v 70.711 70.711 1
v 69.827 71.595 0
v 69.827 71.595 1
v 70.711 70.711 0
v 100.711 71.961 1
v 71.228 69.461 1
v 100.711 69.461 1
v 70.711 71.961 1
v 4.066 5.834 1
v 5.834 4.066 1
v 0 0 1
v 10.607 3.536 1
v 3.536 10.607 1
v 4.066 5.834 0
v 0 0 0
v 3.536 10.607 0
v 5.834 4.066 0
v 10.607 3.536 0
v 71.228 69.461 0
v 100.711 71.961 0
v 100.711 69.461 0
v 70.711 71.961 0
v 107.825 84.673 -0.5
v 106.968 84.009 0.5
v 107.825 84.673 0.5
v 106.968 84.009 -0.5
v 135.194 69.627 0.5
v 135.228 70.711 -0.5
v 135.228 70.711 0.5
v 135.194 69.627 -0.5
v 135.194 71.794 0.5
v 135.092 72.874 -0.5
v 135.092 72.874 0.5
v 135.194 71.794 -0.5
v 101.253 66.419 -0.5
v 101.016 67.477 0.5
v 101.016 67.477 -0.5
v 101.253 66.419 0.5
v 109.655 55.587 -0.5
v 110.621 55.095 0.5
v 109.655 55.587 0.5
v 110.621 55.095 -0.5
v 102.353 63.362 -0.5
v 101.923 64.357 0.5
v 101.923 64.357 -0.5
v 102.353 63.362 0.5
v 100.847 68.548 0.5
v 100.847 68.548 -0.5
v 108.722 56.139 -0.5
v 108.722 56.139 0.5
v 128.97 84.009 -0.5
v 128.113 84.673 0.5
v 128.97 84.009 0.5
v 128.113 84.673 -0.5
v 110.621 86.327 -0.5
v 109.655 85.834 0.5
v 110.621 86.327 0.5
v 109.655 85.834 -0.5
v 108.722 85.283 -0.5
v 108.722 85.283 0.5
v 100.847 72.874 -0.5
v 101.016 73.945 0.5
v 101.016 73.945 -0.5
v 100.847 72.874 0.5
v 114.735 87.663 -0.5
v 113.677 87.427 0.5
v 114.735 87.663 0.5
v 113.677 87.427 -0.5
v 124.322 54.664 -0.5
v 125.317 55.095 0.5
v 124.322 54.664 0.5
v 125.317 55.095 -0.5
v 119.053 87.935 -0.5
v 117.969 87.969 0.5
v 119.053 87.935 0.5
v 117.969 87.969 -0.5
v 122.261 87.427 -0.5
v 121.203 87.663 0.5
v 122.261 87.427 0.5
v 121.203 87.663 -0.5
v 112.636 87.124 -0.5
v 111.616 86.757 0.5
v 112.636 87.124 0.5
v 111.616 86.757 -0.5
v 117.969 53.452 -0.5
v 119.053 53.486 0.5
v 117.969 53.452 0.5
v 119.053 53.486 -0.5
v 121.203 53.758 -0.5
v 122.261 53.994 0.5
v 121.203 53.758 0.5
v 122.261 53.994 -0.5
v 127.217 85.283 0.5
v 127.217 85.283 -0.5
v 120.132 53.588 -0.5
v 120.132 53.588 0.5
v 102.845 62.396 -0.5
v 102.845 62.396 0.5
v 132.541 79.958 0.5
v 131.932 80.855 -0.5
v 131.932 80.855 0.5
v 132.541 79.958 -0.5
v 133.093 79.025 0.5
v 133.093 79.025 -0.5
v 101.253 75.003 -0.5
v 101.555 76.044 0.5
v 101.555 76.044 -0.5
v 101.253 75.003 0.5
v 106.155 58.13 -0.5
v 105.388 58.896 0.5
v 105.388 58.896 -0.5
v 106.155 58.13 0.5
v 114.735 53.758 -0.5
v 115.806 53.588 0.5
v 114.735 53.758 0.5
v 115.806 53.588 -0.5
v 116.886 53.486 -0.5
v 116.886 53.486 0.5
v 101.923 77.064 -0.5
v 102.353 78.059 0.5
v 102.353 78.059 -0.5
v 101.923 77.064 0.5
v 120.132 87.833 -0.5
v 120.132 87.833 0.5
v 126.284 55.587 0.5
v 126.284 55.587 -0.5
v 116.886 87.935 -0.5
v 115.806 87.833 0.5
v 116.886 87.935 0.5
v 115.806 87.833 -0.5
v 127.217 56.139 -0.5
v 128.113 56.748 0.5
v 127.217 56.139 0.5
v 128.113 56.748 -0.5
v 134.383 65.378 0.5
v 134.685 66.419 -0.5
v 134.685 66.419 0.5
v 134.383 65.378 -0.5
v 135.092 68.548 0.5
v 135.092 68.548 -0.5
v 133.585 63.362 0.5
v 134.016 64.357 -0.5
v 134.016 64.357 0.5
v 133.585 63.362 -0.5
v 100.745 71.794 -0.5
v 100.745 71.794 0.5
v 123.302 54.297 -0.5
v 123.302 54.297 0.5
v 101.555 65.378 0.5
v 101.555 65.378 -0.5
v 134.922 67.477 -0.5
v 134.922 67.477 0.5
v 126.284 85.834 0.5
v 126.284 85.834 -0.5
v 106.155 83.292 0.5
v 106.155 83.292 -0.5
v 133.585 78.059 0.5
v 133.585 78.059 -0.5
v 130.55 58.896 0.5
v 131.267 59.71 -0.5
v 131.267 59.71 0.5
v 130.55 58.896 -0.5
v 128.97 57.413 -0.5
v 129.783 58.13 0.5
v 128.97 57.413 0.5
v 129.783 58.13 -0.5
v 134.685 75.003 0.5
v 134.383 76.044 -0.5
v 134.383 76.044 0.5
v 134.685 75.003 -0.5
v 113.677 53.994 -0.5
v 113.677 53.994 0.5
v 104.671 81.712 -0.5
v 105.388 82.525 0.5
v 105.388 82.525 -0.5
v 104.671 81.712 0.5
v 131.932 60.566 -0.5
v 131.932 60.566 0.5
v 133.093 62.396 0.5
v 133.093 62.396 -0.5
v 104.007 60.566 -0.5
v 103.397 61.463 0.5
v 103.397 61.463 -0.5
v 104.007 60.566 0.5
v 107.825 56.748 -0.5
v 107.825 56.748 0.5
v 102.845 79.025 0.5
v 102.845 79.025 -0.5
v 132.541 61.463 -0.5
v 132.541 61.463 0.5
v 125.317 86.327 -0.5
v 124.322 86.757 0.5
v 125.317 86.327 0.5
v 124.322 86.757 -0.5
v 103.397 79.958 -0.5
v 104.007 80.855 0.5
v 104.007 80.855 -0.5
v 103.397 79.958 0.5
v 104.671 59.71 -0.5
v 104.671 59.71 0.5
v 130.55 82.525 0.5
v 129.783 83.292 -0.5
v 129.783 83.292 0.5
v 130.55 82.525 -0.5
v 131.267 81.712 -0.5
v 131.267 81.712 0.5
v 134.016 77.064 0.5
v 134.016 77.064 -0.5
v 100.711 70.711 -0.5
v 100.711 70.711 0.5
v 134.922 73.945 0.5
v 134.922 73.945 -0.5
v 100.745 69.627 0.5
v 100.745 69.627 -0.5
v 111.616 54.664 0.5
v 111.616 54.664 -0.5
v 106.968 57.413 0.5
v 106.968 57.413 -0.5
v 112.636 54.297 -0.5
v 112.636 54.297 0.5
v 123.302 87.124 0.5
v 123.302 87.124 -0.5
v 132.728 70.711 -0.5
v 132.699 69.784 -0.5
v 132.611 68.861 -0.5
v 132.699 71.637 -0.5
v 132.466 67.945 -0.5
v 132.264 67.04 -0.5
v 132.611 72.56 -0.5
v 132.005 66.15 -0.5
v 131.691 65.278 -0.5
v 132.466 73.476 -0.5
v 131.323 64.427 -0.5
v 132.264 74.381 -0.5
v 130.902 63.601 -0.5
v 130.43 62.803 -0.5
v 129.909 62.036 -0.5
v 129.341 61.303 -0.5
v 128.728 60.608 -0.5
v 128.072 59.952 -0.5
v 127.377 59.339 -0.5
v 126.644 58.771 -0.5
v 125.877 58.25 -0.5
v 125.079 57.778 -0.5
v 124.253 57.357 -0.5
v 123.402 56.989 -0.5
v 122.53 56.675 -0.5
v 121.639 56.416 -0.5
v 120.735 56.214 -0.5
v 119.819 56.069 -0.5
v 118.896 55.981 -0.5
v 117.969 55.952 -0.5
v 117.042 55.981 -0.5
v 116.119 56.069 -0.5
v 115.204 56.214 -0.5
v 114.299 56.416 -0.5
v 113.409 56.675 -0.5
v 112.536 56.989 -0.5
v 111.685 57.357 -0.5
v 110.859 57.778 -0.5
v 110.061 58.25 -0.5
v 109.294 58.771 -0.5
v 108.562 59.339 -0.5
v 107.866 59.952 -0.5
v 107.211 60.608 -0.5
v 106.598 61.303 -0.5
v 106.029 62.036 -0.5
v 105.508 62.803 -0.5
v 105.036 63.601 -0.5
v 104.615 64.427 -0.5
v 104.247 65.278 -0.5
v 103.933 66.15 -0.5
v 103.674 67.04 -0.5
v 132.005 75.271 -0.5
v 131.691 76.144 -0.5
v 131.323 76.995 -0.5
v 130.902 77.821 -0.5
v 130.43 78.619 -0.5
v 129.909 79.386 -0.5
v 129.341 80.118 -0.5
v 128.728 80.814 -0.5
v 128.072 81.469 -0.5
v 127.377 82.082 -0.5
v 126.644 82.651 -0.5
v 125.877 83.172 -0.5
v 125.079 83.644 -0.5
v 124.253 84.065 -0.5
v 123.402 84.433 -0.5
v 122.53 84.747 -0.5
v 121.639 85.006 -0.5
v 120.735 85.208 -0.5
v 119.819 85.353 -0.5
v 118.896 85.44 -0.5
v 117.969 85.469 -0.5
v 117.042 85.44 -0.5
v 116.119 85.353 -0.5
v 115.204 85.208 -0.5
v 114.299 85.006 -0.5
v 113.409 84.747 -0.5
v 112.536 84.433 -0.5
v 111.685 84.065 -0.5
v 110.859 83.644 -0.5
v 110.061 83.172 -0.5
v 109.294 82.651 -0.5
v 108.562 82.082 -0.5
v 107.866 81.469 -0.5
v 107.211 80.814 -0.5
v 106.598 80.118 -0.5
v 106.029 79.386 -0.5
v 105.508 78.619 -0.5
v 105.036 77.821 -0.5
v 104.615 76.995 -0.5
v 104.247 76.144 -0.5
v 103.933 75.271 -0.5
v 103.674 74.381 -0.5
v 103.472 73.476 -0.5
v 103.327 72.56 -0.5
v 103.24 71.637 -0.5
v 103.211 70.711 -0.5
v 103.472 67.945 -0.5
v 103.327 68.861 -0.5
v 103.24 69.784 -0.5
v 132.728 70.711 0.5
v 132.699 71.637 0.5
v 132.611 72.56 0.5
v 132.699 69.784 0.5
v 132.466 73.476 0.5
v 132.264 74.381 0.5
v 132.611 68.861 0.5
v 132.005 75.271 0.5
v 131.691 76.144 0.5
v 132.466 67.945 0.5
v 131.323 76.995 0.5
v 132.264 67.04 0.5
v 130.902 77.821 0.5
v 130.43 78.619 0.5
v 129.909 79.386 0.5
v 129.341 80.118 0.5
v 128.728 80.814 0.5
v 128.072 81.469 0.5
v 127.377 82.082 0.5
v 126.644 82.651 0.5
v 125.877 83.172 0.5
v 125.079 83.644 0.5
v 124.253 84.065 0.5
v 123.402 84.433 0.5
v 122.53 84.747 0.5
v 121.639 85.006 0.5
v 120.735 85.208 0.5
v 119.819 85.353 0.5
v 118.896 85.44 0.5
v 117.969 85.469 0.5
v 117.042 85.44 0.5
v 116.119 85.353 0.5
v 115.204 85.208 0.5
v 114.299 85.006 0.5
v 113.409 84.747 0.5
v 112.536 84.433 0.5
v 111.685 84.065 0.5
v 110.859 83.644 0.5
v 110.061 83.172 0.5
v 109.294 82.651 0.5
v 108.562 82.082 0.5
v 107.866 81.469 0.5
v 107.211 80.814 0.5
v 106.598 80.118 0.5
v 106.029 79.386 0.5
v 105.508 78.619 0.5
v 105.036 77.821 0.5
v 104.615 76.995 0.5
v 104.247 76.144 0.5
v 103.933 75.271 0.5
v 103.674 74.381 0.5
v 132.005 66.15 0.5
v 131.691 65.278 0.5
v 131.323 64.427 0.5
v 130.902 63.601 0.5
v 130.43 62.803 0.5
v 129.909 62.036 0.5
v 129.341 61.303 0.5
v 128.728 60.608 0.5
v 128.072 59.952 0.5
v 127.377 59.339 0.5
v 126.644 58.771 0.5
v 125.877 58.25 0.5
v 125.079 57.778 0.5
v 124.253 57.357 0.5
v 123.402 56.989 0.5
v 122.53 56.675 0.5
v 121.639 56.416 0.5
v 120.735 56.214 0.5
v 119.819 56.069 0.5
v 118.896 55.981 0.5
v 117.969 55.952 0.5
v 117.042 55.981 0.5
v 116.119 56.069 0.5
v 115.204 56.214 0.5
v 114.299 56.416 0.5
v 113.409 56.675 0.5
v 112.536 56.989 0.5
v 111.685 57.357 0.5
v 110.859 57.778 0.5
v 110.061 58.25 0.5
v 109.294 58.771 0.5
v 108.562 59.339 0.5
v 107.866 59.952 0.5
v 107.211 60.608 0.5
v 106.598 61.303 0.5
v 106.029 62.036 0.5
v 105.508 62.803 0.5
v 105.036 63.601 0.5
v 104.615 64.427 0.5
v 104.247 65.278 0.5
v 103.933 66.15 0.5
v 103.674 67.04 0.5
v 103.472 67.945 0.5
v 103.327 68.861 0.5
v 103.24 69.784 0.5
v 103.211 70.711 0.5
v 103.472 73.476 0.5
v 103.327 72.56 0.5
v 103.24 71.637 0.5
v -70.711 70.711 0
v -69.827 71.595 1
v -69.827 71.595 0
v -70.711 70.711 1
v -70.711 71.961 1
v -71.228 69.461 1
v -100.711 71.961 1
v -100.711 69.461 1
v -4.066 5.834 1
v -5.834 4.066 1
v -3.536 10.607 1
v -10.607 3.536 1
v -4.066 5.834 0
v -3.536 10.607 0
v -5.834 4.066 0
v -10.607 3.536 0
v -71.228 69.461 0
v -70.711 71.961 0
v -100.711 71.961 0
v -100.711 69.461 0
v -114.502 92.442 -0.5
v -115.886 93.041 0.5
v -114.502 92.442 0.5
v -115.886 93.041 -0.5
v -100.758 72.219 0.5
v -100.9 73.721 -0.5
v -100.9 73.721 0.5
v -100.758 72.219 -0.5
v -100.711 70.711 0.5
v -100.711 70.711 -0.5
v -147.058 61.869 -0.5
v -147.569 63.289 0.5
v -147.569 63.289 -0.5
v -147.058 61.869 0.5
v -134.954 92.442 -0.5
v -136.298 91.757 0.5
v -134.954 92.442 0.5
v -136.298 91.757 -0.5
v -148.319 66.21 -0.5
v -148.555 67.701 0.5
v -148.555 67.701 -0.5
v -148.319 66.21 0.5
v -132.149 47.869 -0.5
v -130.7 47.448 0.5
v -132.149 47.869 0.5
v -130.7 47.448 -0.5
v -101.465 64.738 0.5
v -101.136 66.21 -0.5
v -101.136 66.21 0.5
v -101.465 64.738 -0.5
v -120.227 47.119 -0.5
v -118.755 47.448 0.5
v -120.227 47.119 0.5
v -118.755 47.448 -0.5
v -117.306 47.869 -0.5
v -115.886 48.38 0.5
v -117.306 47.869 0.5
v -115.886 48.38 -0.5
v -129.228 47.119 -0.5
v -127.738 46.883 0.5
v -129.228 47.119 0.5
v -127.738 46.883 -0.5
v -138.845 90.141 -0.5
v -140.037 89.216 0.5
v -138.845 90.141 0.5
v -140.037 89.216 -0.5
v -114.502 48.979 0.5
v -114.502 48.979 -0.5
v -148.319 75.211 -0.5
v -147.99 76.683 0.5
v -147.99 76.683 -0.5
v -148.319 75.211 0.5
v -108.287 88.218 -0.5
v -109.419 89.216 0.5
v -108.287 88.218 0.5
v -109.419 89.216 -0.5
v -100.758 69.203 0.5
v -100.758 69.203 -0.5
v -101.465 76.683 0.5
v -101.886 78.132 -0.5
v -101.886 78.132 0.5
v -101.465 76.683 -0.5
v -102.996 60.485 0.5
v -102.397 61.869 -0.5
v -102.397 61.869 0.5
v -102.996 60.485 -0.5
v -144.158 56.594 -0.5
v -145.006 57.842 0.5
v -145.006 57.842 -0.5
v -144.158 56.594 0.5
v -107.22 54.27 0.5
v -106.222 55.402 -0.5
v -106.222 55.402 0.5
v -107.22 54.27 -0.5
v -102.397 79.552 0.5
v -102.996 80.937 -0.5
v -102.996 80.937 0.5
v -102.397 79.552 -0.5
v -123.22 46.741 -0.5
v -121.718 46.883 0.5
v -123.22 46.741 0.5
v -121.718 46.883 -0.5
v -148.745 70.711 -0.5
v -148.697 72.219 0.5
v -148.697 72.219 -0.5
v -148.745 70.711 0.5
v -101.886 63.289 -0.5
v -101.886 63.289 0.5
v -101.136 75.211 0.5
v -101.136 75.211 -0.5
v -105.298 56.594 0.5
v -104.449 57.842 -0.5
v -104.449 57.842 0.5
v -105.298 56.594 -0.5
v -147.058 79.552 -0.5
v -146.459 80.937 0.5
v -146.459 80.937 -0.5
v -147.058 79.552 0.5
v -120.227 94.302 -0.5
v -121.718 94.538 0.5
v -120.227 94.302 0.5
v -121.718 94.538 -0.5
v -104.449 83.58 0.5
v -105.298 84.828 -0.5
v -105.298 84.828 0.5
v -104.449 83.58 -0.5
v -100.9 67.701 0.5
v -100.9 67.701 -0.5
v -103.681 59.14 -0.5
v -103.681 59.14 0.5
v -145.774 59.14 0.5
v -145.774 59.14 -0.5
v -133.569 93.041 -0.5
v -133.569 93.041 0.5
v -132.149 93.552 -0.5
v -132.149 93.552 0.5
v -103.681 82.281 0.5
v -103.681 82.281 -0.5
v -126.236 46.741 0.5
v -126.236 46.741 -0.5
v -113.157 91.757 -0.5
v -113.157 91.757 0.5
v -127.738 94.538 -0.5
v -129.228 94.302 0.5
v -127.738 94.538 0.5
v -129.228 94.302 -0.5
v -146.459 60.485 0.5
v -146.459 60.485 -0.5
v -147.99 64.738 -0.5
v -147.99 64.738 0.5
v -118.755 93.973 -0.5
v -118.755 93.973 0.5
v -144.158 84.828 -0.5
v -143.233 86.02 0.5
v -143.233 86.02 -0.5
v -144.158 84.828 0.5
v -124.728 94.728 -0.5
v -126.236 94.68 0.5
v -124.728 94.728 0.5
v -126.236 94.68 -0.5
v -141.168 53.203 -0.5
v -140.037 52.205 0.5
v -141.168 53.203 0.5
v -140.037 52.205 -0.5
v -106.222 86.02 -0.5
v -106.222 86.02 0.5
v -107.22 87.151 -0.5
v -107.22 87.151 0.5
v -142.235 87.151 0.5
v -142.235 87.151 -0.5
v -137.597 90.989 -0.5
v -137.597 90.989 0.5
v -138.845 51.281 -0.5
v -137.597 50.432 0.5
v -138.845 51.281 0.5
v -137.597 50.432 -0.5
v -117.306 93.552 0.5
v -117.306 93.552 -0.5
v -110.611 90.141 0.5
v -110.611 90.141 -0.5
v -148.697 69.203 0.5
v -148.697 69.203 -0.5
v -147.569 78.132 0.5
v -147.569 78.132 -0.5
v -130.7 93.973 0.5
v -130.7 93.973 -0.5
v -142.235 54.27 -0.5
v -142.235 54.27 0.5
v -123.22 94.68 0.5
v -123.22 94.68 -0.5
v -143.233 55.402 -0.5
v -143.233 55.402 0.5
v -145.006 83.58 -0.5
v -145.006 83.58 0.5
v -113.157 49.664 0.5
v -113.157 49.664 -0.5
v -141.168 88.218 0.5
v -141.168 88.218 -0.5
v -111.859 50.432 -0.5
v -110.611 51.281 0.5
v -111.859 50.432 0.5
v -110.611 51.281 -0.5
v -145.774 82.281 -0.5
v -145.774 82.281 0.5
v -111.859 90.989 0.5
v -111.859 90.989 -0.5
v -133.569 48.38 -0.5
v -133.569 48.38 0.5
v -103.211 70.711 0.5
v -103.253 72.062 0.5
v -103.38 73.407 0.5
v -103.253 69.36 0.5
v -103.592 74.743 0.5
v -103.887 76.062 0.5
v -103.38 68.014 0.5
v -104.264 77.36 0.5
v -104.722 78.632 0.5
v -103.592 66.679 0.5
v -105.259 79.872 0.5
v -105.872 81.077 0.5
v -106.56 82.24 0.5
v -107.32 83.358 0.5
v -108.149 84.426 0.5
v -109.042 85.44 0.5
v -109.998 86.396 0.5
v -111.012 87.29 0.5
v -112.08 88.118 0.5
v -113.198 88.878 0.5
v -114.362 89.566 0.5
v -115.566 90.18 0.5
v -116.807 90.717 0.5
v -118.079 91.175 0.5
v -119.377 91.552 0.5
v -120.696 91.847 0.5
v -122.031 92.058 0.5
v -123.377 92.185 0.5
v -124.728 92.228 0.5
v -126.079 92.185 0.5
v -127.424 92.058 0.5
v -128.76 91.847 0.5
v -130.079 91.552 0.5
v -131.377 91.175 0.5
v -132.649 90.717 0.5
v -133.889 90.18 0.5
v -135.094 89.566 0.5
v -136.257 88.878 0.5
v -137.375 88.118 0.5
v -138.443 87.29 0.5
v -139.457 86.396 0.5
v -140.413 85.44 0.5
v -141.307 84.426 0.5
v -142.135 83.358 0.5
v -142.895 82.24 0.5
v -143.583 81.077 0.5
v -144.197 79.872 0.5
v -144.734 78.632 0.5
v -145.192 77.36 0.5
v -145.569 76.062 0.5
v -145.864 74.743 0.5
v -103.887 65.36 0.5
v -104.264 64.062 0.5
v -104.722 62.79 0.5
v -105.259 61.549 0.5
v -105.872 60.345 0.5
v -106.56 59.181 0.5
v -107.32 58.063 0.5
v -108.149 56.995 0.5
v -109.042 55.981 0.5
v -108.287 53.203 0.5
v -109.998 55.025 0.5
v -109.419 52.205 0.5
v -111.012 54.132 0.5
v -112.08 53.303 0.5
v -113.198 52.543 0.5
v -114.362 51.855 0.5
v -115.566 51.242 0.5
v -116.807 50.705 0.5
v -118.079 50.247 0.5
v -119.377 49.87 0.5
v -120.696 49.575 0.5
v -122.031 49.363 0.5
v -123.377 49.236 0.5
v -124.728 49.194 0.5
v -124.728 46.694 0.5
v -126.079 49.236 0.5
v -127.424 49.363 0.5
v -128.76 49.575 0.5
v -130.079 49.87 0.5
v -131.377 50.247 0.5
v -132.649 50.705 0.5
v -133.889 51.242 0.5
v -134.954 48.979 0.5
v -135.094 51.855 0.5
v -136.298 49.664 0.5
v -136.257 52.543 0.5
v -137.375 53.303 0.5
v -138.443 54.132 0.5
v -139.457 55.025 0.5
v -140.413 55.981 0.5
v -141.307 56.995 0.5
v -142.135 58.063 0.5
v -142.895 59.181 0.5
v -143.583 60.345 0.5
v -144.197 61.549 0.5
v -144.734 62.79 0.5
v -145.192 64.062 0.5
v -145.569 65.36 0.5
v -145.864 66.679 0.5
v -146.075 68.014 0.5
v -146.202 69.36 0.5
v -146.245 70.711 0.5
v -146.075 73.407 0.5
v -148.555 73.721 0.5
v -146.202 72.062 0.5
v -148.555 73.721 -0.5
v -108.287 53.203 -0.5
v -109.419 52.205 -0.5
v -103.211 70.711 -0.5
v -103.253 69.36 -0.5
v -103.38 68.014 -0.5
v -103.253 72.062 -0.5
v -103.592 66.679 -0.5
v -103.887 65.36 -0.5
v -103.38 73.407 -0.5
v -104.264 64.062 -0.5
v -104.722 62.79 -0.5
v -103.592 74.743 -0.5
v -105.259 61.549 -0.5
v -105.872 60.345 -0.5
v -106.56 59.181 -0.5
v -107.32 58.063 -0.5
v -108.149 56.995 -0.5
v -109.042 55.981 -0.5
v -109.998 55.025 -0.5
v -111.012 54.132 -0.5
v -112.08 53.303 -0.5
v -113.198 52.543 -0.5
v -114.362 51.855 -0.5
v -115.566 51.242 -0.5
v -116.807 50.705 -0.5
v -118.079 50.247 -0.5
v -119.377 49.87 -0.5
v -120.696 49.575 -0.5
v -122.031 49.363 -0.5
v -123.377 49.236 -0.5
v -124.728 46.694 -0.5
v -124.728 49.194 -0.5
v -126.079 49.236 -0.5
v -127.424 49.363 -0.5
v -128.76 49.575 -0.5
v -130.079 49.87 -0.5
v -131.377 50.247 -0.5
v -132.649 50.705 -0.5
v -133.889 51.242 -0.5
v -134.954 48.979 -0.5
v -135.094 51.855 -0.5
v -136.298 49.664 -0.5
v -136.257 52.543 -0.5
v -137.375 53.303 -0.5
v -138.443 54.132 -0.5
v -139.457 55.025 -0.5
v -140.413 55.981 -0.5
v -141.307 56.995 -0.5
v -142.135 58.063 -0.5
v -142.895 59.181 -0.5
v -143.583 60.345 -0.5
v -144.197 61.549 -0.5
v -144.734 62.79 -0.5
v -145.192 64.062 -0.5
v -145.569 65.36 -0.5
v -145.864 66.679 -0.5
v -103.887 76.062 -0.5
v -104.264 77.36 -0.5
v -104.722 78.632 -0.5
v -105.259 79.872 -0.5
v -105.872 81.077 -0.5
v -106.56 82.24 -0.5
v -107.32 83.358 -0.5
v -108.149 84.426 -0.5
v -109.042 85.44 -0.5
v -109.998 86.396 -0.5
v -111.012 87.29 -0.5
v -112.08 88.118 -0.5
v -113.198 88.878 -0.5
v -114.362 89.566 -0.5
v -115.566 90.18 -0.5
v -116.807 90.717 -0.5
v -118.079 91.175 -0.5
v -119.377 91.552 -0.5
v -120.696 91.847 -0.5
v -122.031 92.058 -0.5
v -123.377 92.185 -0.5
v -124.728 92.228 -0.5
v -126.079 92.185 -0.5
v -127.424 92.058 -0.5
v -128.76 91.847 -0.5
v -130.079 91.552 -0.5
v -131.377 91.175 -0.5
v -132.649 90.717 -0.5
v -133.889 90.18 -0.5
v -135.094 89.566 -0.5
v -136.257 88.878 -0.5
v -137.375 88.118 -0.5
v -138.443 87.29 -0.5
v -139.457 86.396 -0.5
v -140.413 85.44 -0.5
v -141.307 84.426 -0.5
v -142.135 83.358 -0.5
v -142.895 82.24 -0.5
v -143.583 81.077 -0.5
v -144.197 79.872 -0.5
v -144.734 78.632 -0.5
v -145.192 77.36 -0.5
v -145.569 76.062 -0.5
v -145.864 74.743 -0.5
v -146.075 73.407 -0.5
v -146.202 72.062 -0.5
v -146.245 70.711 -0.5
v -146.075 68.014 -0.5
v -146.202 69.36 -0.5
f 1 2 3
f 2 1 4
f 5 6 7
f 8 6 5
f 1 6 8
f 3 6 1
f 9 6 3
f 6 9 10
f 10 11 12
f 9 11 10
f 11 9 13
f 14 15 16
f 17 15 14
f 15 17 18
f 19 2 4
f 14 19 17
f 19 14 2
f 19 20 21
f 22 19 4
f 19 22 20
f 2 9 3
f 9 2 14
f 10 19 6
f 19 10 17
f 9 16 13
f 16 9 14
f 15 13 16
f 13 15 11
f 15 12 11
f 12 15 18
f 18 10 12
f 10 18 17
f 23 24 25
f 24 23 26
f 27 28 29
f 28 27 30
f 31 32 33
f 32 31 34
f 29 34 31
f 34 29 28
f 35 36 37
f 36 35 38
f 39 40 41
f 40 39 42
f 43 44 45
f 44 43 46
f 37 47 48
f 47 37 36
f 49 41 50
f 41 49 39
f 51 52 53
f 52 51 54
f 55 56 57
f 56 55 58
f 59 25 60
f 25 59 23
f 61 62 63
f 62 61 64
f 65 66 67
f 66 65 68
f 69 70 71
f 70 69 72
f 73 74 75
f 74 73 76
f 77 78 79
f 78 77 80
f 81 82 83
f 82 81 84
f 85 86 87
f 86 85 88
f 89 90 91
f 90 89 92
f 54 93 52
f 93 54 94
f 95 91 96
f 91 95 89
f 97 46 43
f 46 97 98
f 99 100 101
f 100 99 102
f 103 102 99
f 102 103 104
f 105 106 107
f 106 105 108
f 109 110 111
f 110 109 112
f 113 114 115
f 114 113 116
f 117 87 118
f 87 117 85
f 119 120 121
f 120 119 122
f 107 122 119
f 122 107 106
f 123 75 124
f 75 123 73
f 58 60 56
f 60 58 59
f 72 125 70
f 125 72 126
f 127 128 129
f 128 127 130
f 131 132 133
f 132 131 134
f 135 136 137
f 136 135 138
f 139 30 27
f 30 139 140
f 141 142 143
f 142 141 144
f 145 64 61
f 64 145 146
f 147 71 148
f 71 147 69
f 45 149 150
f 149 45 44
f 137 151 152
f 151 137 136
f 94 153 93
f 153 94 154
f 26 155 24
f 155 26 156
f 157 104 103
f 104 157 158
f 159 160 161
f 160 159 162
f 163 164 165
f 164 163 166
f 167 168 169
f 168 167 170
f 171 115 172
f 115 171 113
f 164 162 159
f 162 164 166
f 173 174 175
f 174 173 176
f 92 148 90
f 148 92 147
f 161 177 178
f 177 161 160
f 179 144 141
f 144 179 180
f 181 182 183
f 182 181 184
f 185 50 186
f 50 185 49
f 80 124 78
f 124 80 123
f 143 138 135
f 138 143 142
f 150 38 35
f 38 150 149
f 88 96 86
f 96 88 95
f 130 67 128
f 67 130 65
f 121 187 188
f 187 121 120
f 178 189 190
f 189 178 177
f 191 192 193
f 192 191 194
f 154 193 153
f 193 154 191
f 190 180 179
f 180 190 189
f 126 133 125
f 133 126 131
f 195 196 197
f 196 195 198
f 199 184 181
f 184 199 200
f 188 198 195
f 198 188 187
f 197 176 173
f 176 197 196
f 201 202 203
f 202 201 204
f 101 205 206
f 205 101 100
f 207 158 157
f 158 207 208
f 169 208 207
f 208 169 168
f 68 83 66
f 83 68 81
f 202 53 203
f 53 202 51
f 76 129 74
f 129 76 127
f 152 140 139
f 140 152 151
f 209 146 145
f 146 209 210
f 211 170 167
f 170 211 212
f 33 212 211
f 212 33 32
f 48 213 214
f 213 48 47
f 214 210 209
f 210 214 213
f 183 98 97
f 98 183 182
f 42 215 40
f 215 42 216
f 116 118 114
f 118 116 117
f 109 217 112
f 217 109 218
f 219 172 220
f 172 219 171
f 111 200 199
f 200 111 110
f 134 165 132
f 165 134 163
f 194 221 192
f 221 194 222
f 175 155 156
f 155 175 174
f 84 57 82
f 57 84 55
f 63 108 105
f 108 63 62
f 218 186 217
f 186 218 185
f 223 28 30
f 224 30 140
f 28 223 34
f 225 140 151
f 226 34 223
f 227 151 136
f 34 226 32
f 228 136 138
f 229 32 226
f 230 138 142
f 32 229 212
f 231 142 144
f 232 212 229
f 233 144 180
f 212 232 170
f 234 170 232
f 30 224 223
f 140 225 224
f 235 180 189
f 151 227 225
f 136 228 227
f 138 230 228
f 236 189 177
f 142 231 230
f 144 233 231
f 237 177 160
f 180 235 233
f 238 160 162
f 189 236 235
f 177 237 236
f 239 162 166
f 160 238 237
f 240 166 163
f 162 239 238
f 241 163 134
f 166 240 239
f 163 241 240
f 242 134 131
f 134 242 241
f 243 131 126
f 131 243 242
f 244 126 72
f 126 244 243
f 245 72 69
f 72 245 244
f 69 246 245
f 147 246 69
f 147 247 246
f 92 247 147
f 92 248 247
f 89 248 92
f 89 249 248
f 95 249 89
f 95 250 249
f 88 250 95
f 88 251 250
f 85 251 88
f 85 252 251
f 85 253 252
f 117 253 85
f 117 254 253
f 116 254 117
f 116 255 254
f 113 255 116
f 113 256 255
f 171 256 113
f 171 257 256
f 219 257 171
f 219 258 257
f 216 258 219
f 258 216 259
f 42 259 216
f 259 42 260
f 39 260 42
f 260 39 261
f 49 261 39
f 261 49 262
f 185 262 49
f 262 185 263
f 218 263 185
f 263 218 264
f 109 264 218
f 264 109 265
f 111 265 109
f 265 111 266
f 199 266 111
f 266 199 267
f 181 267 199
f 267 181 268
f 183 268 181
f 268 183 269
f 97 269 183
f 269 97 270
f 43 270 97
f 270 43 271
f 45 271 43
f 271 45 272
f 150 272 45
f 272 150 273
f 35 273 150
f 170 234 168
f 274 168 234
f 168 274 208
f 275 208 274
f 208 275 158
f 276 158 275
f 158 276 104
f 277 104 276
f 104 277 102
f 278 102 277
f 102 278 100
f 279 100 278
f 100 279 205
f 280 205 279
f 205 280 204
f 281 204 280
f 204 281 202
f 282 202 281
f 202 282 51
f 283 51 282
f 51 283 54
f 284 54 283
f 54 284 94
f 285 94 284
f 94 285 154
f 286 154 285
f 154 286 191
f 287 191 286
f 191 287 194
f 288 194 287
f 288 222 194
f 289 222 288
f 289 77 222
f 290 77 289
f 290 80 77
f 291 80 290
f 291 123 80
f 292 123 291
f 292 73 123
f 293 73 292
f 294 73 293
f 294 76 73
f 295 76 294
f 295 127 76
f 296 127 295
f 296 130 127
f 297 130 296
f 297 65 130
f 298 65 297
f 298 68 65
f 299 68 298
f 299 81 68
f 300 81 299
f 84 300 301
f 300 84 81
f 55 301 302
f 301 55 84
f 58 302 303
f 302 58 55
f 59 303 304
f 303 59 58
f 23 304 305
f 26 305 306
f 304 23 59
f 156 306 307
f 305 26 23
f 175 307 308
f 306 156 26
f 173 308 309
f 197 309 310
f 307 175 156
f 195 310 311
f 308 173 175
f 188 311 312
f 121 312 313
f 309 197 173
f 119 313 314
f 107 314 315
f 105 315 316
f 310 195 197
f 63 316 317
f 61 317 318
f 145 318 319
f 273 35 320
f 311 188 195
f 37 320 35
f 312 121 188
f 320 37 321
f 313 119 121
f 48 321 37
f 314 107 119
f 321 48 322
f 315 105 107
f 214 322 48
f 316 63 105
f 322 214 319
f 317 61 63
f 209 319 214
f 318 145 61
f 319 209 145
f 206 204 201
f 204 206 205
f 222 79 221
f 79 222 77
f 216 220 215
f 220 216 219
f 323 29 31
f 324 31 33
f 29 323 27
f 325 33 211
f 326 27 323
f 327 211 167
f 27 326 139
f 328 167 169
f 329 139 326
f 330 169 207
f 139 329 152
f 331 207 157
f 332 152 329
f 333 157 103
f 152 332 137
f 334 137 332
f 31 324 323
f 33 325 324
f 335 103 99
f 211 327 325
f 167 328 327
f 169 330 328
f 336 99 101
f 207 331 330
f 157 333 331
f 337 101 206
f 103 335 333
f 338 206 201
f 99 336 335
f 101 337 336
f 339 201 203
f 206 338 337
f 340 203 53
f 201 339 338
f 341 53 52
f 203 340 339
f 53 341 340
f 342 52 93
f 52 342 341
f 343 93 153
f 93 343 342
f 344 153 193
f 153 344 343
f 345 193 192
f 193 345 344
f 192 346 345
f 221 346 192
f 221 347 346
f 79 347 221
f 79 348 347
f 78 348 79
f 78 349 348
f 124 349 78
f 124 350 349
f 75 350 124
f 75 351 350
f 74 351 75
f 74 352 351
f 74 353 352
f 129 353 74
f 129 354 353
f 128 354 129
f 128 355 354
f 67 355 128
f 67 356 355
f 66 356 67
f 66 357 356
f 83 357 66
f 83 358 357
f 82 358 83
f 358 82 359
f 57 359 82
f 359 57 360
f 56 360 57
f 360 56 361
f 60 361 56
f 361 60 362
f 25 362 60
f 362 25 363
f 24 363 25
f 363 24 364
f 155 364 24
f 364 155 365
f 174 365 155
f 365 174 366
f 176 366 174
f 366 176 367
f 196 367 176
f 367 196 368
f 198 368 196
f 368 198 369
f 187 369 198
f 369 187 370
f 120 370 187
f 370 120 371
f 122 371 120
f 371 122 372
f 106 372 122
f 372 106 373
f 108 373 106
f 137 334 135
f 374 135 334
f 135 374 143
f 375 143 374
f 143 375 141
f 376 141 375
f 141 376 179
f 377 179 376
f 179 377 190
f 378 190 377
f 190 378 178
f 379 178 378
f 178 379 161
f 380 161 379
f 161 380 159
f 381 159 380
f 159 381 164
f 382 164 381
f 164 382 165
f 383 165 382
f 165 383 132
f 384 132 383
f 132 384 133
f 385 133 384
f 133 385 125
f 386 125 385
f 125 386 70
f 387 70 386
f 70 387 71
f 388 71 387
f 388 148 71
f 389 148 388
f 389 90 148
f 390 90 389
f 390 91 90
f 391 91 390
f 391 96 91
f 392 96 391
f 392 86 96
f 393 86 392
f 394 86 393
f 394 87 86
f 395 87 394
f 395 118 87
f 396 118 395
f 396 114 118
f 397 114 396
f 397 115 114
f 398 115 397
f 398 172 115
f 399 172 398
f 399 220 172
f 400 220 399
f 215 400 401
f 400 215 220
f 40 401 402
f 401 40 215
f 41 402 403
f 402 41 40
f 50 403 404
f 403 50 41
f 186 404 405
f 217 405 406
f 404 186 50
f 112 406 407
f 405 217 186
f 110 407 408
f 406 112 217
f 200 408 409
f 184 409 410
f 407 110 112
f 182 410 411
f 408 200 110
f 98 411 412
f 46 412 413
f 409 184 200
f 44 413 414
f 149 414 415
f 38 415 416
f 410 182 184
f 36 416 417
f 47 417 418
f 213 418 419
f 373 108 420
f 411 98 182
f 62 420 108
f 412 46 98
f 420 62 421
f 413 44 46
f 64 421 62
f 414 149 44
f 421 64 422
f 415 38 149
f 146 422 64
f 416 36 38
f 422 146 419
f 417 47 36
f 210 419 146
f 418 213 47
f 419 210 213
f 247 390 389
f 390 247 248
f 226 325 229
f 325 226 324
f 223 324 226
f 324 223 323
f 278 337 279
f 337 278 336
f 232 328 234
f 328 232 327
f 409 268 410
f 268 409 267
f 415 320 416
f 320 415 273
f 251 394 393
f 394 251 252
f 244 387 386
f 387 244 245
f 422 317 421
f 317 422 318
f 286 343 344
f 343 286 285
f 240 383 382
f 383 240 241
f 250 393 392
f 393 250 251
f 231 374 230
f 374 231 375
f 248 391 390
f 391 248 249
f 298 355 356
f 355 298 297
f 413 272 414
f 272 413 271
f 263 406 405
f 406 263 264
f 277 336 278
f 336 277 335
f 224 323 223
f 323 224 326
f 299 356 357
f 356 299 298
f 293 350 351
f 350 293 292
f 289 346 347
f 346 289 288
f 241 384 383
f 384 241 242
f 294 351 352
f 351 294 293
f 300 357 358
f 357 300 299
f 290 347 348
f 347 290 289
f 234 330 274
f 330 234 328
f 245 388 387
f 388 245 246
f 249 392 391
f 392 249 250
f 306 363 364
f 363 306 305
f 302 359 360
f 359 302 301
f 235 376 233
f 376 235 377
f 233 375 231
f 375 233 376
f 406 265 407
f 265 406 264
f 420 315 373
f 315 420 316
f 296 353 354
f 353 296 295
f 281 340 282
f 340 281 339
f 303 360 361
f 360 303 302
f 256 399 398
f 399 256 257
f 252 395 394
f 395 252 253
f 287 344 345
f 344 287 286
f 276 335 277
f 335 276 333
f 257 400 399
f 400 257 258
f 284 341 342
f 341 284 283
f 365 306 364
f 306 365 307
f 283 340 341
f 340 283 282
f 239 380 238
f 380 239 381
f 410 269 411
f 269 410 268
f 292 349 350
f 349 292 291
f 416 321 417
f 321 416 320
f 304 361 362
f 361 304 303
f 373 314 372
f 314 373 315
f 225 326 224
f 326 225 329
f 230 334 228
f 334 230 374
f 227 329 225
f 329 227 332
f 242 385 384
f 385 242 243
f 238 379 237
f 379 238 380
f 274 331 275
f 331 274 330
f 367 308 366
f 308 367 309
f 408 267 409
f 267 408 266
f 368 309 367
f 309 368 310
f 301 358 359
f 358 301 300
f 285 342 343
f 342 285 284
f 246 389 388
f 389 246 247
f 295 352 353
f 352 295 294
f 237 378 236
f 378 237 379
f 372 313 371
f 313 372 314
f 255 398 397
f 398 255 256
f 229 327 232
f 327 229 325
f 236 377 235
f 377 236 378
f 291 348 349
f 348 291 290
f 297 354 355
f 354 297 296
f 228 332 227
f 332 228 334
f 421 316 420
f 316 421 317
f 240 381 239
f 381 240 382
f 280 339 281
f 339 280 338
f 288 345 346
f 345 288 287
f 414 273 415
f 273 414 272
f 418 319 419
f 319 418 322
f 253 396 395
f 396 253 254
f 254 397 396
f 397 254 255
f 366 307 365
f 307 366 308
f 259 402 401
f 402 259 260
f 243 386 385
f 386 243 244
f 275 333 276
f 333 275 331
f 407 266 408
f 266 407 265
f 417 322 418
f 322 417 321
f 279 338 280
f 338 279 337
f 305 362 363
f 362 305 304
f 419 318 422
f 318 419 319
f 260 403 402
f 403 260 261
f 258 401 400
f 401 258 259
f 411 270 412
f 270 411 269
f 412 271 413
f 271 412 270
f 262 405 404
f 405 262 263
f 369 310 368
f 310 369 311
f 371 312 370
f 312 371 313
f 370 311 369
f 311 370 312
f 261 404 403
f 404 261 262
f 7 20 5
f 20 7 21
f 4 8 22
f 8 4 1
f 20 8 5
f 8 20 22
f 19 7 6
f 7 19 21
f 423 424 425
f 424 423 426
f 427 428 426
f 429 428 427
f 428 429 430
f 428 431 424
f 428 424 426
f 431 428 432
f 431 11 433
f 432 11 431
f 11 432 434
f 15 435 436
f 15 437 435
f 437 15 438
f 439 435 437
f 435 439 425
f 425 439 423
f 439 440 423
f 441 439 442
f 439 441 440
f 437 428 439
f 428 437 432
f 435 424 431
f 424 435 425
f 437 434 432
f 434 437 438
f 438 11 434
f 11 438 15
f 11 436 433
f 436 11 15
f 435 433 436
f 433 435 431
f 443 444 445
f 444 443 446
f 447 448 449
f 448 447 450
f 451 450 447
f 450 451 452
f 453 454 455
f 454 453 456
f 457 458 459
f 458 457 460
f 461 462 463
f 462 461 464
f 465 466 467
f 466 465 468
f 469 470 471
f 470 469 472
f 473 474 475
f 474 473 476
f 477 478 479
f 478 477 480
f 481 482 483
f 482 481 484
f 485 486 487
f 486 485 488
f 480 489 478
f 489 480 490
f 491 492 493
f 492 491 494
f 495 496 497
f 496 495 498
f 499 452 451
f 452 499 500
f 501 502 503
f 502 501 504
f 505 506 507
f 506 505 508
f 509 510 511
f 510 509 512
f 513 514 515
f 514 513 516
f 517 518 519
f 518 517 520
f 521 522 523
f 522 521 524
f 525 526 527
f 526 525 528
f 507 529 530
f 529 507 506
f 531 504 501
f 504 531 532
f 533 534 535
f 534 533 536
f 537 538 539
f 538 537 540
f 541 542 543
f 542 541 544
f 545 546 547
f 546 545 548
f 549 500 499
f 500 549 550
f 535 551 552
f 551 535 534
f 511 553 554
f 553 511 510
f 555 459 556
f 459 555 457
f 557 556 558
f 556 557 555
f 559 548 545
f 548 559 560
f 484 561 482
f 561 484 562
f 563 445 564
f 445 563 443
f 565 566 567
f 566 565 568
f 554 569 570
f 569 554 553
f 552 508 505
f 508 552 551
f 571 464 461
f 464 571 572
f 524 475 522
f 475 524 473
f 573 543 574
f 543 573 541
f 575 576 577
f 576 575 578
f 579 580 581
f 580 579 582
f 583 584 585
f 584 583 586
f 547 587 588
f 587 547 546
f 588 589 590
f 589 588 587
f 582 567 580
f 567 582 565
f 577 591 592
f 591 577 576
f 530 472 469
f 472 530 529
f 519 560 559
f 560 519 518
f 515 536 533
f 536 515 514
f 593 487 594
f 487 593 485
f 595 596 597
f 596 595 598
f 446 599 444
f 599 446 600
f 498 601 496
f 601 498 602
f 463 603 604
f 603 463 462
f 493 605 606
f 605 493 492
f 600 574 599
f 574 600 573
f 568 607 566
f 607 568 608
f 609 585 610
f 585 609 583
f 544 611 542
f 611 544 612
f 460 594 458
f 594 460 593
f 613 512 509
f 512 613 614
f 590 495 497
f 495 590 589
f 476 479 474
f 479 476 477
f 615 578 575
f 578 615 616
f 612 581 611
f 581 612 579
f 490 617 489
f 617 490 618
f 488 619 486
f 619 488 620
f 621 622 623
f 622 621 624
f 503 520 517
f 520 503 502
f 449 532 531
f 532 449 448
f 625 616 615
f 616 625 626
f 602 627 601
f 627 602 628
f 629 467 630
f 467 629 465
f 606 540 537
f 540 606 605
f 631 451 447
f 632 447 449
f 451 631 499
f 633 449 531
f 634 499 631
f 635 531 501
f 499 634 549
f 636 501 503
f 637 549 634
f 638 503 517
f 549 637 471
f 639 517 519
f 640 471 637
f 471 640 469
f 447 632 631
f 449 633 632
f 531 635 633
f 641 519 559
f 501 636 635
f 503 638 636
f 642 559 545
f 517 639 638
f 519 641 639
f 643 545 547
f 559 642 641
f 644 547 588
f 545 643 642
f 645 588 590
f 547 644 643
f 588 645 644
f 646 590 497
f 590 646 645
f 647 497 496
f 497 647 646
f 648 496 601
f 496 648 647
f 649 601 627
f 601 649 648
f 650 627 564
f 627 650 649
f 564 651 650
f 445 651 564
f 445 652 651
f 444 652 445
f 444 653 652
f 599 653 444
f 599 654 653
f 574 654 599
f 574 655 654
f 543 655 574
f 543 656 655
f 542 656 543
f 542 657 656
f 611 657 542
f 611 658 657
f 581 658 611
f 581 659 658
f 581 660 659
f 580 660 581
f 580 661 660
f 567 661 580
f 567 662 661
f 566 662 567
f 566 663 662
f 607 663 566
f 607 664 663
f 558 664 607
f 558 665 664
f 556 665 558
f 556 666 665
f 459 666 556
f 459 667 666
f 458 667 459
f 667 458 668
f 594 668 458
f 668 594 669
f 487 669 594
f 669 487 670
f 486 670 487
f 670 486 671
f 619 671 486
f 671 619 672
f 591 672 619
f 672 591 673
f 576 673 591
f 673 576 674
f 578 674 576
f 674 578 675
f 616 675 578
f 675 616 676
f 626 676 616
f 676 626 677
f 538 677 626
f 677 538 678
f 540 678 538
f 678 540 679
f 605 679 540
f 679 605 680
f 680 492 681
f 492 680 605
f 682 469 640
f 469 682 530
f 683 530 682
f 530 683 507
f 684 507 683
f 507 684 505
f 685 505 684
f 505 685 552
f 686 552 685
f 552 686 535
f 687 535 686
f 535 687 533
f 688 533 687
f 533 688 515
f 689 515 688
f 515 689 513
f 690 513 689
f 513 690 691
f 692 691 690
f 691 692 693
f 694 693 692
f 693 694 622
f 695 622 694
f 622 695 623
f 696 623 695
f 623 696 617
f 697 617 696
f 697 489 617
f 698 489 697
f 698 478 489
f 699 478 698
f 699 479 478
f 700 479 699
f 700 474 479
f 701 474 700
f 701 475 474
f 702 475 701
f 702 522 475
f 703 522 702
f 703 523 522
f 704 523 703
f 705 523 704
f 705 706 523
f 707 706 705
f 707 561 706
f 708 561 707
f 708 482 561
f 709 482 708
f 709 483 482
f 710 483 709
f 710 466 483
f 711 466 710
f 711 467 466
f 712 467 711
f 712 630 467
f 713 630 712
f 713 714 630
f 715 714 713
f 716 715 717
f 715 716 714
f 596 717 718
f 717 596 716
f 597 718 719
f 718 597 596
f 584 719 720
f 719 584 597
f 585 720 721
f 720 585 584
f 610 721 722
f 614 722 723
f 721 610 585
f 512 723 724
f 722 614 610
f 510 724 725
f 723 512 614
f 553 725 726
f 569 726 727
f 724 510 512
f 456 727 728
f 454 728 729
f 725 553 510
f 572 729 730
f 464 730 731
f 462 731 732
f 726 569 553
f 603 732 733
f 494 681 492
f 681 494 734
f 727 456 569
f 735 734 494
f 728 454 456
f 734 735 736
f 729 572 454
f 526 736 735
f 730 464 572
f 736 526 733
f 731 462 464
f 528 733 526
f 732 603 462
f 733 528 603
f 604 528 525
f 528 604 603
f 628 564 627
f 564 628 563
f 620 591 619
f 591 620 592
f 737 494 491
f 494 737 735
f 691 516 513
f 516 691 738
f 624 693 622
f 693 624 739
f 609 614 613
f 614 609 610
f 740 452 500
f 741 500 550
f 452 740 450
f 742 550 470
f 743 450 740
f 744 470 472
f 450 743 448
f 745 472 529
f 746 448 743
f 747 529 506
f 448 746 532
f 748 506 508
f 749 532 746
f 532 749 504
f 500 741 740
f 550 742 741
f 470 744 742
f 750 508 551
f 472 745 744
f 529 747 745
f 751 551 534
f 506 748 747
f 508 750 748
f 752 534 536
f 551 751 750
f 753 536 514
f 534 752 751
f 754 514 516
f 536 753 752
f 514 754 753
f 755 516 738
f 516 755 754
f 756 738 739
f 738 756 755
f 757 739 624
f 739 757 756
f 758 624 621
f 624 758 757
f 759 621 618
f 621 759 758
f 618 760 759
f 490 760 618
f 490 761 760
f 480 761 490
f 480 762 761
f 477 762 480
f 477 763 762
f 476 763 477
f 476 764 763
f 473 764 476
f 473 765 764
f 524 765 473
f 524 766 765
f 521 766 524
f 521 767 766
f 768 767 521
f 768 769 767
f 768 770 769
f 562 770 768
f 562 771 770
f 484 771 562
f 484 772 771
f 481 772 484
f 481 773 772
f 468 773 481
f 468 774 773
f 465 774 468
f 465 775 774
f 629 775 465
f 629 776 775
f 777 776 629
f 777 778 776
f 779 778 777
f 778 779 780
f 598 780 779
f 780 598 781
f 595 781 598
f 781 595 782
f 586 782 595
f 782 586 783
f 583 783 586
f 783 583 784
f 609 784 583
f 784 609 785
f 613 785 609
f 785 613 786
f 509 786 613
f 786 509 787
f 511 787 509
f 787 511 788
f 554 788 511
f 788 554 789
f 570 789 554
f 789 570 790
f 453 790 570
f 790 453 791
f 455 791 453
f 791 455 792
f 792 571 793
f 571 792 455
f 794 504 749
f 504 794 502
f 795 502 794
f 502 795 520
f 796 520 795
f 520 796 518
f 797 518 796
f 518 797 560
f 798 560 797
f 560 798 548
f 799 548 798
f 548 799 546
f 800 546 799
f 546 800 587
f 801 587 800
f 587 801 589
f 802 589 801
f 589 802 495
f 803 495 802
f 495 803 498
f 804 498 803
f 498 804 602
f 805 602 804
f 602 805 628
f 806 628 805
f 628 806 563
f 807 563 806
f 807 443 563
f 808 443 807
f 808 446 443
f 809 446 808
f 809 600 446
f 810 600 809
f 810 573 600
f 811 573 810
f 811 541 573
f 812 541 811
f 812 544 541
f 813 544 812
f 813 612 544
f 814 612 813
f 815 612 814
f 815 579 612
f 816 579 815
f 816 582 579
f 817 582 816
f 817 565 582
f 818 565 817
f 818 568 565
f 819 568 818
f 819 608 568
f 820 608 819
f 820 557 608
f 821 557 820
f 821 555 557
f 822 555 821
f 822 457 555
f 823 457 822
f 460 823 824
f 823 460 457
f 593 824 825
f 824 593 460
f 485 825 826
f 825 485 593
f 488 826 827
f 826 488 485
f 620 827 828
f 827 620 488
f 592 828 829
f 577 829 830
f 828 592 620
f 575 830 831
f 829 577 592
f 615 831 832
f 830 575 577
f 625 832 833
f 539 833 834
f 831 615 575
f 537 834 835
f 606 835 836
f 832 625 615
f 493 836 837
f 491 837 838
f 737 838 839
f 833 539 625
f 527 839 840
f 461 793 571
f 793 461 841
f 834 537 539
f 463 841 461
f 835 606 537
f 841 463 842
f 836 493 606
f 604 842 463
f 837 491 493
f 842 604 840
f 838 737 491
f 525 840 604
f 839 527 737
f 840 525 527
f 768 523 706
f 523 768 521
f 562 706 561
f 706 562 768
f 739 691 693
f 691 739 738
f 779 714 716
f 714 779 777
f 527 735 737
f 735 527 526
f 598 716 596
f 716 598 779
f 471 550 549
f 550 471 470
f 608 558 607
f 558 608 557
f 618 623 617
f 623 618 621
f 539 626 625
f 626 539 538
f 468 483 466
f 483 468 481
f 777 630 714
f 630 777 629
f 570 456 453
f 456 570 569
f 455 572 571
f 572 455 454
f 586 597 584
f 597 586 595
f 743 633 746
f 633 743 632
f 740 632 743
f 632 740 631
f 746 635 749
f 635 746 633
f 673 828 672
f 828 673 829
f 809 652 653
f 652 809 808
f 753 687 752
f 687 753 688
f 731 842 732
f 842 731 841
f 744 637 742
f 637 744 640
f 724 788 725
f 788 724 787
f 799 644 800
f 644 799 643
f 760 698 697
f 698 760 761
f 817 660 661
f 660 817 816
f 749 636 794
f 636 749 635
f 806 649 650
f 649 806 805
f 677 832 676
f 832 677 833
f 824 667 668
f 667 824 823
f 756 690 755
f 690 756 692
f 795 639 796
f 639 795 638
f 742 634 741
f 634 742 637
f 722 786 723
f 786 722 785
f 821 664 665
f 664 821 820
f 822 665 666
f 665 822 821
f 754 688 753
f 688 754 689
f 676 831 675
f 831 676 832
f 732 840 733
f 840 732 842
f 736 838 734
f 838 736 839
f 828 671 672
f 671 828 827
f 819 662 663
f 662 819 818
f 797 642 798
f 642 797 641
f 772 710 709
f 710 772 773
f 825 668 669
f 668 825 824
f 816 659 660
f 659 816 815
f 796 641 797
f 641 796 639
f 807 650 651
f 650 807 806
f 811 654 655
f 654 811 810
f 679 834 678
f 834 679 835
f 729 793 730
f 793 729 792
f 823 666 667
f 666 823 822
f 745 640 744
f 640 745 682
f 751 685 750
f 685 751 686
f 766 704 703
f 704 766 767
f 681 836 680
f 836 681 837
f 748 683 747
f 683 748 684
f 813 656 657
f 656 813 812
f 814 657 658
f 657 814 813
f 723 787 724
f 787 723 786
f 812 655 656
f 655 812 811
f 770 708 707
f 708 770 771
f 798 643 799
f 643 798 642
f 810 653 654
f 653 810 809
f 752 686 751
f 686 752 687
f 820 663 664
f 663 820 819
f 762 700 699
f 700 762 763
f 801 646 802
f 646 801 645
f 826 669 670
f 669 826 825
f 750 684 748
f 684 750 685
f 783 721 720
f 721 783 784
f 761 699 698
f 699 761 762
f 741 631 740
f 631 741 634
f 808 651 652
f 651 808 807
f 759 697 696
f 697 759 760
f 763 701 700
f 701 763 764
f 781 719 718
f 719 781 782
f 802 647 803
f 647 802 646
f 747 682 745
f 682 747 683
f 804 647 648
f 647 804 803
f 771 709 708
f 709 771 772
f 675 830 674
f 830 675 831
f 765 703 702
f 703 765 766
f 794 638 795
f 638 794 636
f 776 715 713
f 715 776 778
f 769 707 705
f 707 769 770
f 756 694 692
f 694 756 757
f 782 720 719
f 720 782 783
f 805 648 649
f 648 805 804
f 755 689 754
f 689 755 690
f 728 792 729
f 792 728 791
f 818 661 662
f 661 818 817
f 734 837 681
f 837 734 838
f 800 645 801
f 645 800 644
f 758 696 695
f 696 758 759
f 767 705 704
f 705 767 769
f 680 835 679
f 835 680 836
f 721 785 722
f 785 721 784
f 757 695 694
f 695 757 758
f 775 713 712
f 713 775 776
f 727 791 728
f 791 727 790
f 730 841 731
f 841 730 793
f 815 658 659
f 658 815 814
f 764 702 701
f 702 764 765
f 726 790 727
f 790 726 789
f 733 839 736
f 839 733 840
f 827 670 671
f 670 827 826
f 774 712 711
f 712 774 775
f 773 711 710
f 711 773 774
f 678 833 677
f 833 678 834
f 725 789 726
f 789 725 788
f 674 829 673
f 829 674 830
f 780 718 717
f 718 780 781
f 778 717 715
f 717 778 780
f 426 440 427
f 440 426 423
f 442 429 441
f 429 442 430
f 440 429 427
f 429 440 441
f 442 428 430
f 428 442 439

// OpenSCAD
// file: ../drawing_sheet_sizes.scad
// drawing_sheet_sizes.scad
sheet_sizes = [
    // ISO 216 (A-Series)
    ["A0", [841, 1189]],
    ["A1", [594, 841]],
    ["A2", [420, 594]],
    ["A3", [297, 420]],
    ["A4", [210, 297]],

    // ANSI Standard (U.S.)
    ["ANSI_A", [216, 279]], // 8.5 × 11 inches
    ["ANSI_B", [279, 432]], // 11 × 17 inches
    ["ANSI_C", [432, 559]], // 17 × 22 inches
    ["ANSI_D", [559, 864]], // 22 × 34 inches
    ["ANSI_E", [864, 1118]], // 34 × 44 inches

    // Architectural Sizes (U.S.)
    ["ARCH_A", [229, 305]], // 9 × 12 inches
    ["ARCH_B", [305, 457]], // 12 × 18 inches
    ["ARCH_C", [457, 610]], // 18 × 24 inches
    ["ARCH_D", [610, 914]], // 24 × 36 inches
    ["ARCH_E", [914, 1219]], // 36 × 48 inches

    // ASME Y14.1 (Engineering Drawings)
    ["ENG_A", [216, 279]], // Same as ANSI A
    ["ENG_B", [279, 432]], // Same as ANSI B
    ["ENG_C", [432, 559]], // Same as ANSI C
    ["ENG_D", [559, 864]], // Same as ANSI D
    ["ENG_E", [864, 1118]], // Same as ANSI E

    // JIS B-Series (Japan)
    ["B0", [1030, 1456]],
    ["B1", [728, 1030]],
    ["B2", [515, 728]],
    ["B3", [364, 515]],
    ["B4", [257, 364]],
];
// file: ../src/dd_titleblock.scad
/**
 * @file dd_titleblock.scad
 * @brief Functions for creating title blocks on drawing sheets.
 * @details This file contains functions for creating title blocks on drawing sheets. The titleblock function creates a
 * title block with lines, descriptions, and details based on the given parameters.
 * @copyright (c) 2021 Don Smiley, (c) 2025 Cameron K. Brooks
 */

/*
 * titleblock(lines, descs, details, color, text_color)
 * Creates a title block for a drawing sheet, including lines, descriptions, and details.
 * Parameters:
 * - lines: Array defining the lines in the title block with format:
 *           [[startx, starty, orientation, length, width], ...]
 *           - orientation: Use DIM_HORZ or DIM_VERT for horizontal/vertical lines.
 *           - width: Factor to scale the line width beyond DIM_LINE_WIDTH.
 * - descs: Array defining descriptive text blocks with format:
 *           [[startx, starty, orientation, text, size], ...]
 *           - size: Factor to scale font size beyond DIM_FONTSCALE.
 * - details: Array defining part-specific details with format:
 *           [[startx, starty, orientation, text, size], ...]
 * - color: Line color.
 * - text_color: Text color.
 * Behavior:
 * - Draws lines and places text (descriptions and details) at specified positions.
 * - Handles horizontal and vertical orientations for text and lines.
 */
module titleblock(lines, descs, details, color = DEF_LINE_COLOR, text_color = DEF_TEXT_COLOR) {
    DIM_FONTSCALE = DIM_LINE_WIDTH * 0.7;

    for (line = lines)
    {
        color(color) translate([line[0] * DIM_LINE_WIDTH, line[1] * DIM_LINE_WIDTH, 0]) if (line[2] == DIM_VERT) {
                // a vertical line runs down from its start point, and line() draws upward
                translate([0, -line[3] * DIM_LINE_WIDTH, 0])
                    line(length=line[3] * DIM_LINE_WIDTH, width=DIM_LINE_WIDTH * line[4], vert=true);
            } else {
                line(length=(line[3] + 1) * DIM_LINE_WIDTH, width=DIM_LINE_WIDTH * line[4]);
            }
    }

    color(text_color) {
        for (line = descs)
        {
            translate([line[0] * DIM_LINE_WIDTH, line[1] * DIM_LINE_WIDTH, 0]) if (line[2] == DIM_VERT) {
                rotate([0, 0, 90])
                    scale([DIM_FONTSCALE * line[4], DIM_FONTSCALE * line[4], DIM_FONTSCALE * line[4]]) text(line[3]);
            } else {
                scale([DIM_FONTSCALE * line[4], DIM_FONTSCALE * line[4], DIM_FONTSCALE * line[4]]) text(line[3]);
            }
        }

        for (line = details)
        {
            translate([line[0] * DIM_LINE_WIDTH, line[1] * DIM_LINE_WIDTH, 0]) if (line[2] == DIM_VERT) {
                rotate([0, 0, 90])
                    scale([DIM_FONTSCALE * line[4], DIM_FONTSCALE * line[4], DIM_FONTSCALE * line[4]]) text(line[3]);
            } else {
                scale([DIM_FONTSCALE * line[4], DIM_FONTSCALE * line[4], DIM_FONTSCALE * line[4]]) text(line[3]);
            }
        }
    }
}
// file: ../src/dd_sheet.scad
/**
 * @file dd_sheet.scad
 * @brief Functions for drawing sheets from standard sizes and grid patterns.
 * @details This file contains functions for drawing sheets with standard sizes and grid patterns. The draw_sheet
 * function can draw a sheet boundary based on given dimensions or a standard sheet symbol with a grid or dot pattern.
 * @copyright (c) 2025 Cameron K. Brooks, (c) 2021 Don Smiley
 */

include <../drawing_sheet_sizes.scad>;

/*
 * draw_sheet(length, height, sheet_symbol, grid_type, line_width, color)
 * Draws a sheet boundary based on given dimensions or a standard sheet symbol and adds a grid or dot pattern if
 * specified. Parameters:
 * - length: Length of the sheet (overridden if sheet_symbol is provided).
 * - height: Height of the sheet (overridden if sheet_symbol is provided).
 * - sheet_symbol: Standard sheet size identifier (e.g., "A4", "ANSI_B").
 * - grid_type: "None", "Dot", or "Grid" to specify the background pattern.
 * - line_width: Thickness of the sheet boundary lines.
 * - color: Optional parameter to set the frame's color.
 */
module draw_sheet(
    length = undef,
    height = undef,
    sheet_symbol = undef,
    line_width = DIM_LINE_WIDTH * 2,
    line_height = DIM_LINE_HEIGHT,
    grid_type = "None",
    grid_dim = DIM_GRID_SPACING,
    grid_line_width = DIM_LINE_WIDTH,
    color = DEF_LINE_COLOR
) {
    // If a sheet symbol is provided, it overrides length and height using the sheet_sizes array.
    // An assignment inside an if block is local to that block, so the size is resolved here.
    matches = is_undef(sheet_symbol) ? [] : [for (sheet = sheet_sizes) if (sheet[0] == sheet_symbol) sheet[1]];
    sheet_length = len(matches) > 0 ? matches[0][0] : length;
    sheet_height = len(matches) > 0 ? matches[0][1] : height;

    if (!is_undef(sheet_symbol)) {
        echo("Looking for sheet symbol: ", sheet_symbol);

        if (len(matches) > 0) {
            echo("Match found for sheet symbol: ", sheet_symbol, " Dimensions: ", matches[0]);
        } else {
            echo("Warning: Sheet symbol '", sheet_symbol, "' not found.");
        }
    }

    // Proceed only if length and height are defined
    if (!is_undef(sheet_length) && !is_undef(sheet_height)) {
        // Draw the grid or dots before drawing the frame to ensure it's in the background
        draw_frame(sheet_length, sheet_height, line_width, line_height, color);
        translate([0, 0, -DIM_LINE_WIDTH])
            draw_grid(sheet_length, sheet_height, grid_type, grid_dim, grid_line_width, line_height, "lightgray");
    } else {
        echo("Warning: Invalid dimensions. Frame not drawn.");
    }
}

module draw_frame(length, height, line_width = DIM_LINE_WIDTH, line_height = DIM_LINE_HEIGHT, color = DEF_LINE_COLOR) {
    /*
     * draw_frame(length, height, line_width, color)
     * Draws the rectangular frame of a sheet with specified dimensions and line width.
     * Parameters:
     * - length: Length of the sheet frame.
     * - height: Height of the sheet frame.
     * - line_width: Thickness of the frame lines.
     * - color: Optional parameter to set the frame's color.
     * Behavior:
     * - Creates a rectangular frame with horizontal and vertical lines.
     */
    color(color) {
        // Bottom horizontal line
        line(length=length, width=line_width, height=line_height);

        // Top horizontal line
        translate([0, height, 0]) line(length=length, width=line_width, height=line_height);

        // Left vertical line
        translate([line_width / 2, line_width / 2, 0])
            line(length=height - line_width, width=line_width, height=line_height, vert=true);

        // Right vertical line
        translate([length - line_width / 2, line_width / 2, 0])
            line(length=height - line_width, width=line_width, height=line_height, vert=true);
    }
}

module draw_grid(
    length,
    height,
    type = "None",
    grid_spacing = DIM_GRID_SPACING,
    line_width = DIM_LINE_WIDTH / 2,
    line_height = DIM_LINE_HEIGHT,
    color = "lightgray"
) {
    /*
     * draw_grid(length, height, type, grid_spacing, line_width, color)
     * Adds a grid or dot pattern to the sheet.
     * Parameters:
     * - length: Length of the sheet.
     * - height: Height of the sheet.
     * - type: "None", "Dot", or "Grid" to specify the background pattern.
     * - grid_spacing: Distance between grid lines or dots.
     * - line_width: Thickness of grid lines (ignored for dots).
     * - color: Color of the grid lines or dots.
     */

    if (type == "Grid") {
        color(color) {
            // Draw vertical grid lines
            for (x = [0:grid_spacing:length])
            {
                translate([x, 0, 0]) line(length=height, width=line_width, height=line_height, vert=true);
            }

            // Draw horizontal grid lines
            for (y = [0:grid_spacing:height])
            {
                translate([0, y, 0]) line(
                        length=length, width=line_width, height=line_height,
                        left_arrow=false, right_arrow=false
                    );
            }
        }
    } else if (type == "Dot") {
        color(color) {
            // Define dot size
            dot_size = line_width; // You can adjust the dot size as needed

            for (x = [0:grid_spacing:length])
            {
                for (y = [0:grid_spacing:height])
                {
                    translate([x, y, 0]) sphere(r=dot_size, $fn=12);
                }
            }
        }
    } else {
        echo("No grid or dot pattern selected.");
    }
}
// file: ../dimdraft.scad
// ----- Variables -----
DOC_SCALING_FACTOR = is_undef(SCALING_FACTOR) ? 1 : SCALING_FACTOR;

// Line and text related constants

DIM_LINE_WIDTH_NOMINAL = 0.025; // Nominal line width
DIM_SPACE_NOMINAL = 0.1; // Nominal spacing value for line spacing adjustments
DIM_LINE_HEIGHT_NOMINAL = 0.01; // Nominal height of lines

DIM_LINE_WIDTH =
    is_undef(LINE_WIDTH) ? DIM_LINE_WIDTH_NOMINAL * DOC_SCALING_FACTOR : LINE_WIDTH; // Width of the dimension lines
DIM_LINE_HEIGHT =
    is_undef(HEIGHT) ? DIM_LINE_HEIGHT_NOMINAL * DOC_SCALING_FACTOR : HEIGHT; // Height of the dimension lines
DIM_SPACE =
    is_undef(SPACE) ? DIM_SPACE_NOMINAL * DOC_SCALING_FACTOR : SPACE; // Spacing value for line spacing adjustments

DEF_LINE_COLOR = is_undef(LINE_COLOR) ? "black" : LINE_COLOR; // Default line color
DEF_TEXT_COLOR = is_undef(TEXT_COLOR) ? "black" : TEXT_COLOR; // Default text color

// ----- Dependent Constants -----
// Hole center constant
DIM_HOLE_CENTER = DIM_LINE_WIDTH * 6; // Size of the cross within a circle
// Text is drawn at OpenSCAD's default size of 10 and scaled by DIM_FONTSCALE.
// Its height is 7 line widths unless TEXT_SIZE is set.
DIM_FONTSCALE = is_undef(TEXT_SIZE) ? DIM_LINE_WIDTH * 0.7 : TEXT_SIZE / 10;
DIM_TEXT_SIZE = DIM_FONTSCALE * 10; // Height of the text

DIM_GRID_SPACING = 50; // Default grid spacing value, standard for most drawings (i.e. ISO, ANSI, etc.)

// ----- Constants -----
// Dimension positioning constants
DIM_CENTER = 0;
DIM_LEFT = 1;
DIM_RIGHT = 2;
DIM_OUTSIDE = 3;

// Orientation constants
DIM_HORZ = 0;
DIM_VERT = 1;

// Corner positioning constants
DIM_UPPER_LEFT = 0;
DIM_UPPER_RIGHT = 1;
DIM_LOWER_LEFT = 2;
DIM_LOWER_RIGHT = 3;

// Offset value for hole length
ZFITE = 0.05; // Added to the hole length to extend past the surface of the cube

include <src/dd_dimlines.scad>;
include <src/dd_sheet.scad>;
include <src/dd_titleblock.scad>;
// main file
// The circle around a leader label must be cut right through at a large scale, must be drawn on either side,
// and must end where the shoulder line ends.
// At SCALING_FACTOR = 100 the ring is 1 high, so the cut has to be taller than 1. The gap before the label is 10.5.
// The ring's outer radius is that gap plus half the label width, so its edge meets the end of the shoulder:
//   right, label "1":  10.5 + 13.517 / 2 = 17.2585, cut radius 14.7585
//   left, label "22":  10.5 + 27.034 / 2 = 24.017,  cut radius 21.517
// expect: cylinder\(.*h = 1, r1 = 17\.2585, r2 = 17\.2585
// expect: cylinder\(.*h = 2, r1 = 14\.7585, r2 = 14\.7585
// expect: cylinder\(.*h = 1, r1 = 24\.017, r2 = 24\.017
// expect: cylinder\(.*h = 2, r1 = 21\.517, r2 = 21\.517
// reject: h = 0\.05
SCALING_FACTOR = 100;
include <../dimdraft.scad>

leader_line(angle=45, radius=0, angle_length=100, horz_length=30, text="1", do_circle=true);
leader_line(
    angle=135, radius=0, angle_length=100, horz_length=30, direction=DIM_LEFT, text="22",
    do_circle=true
);
